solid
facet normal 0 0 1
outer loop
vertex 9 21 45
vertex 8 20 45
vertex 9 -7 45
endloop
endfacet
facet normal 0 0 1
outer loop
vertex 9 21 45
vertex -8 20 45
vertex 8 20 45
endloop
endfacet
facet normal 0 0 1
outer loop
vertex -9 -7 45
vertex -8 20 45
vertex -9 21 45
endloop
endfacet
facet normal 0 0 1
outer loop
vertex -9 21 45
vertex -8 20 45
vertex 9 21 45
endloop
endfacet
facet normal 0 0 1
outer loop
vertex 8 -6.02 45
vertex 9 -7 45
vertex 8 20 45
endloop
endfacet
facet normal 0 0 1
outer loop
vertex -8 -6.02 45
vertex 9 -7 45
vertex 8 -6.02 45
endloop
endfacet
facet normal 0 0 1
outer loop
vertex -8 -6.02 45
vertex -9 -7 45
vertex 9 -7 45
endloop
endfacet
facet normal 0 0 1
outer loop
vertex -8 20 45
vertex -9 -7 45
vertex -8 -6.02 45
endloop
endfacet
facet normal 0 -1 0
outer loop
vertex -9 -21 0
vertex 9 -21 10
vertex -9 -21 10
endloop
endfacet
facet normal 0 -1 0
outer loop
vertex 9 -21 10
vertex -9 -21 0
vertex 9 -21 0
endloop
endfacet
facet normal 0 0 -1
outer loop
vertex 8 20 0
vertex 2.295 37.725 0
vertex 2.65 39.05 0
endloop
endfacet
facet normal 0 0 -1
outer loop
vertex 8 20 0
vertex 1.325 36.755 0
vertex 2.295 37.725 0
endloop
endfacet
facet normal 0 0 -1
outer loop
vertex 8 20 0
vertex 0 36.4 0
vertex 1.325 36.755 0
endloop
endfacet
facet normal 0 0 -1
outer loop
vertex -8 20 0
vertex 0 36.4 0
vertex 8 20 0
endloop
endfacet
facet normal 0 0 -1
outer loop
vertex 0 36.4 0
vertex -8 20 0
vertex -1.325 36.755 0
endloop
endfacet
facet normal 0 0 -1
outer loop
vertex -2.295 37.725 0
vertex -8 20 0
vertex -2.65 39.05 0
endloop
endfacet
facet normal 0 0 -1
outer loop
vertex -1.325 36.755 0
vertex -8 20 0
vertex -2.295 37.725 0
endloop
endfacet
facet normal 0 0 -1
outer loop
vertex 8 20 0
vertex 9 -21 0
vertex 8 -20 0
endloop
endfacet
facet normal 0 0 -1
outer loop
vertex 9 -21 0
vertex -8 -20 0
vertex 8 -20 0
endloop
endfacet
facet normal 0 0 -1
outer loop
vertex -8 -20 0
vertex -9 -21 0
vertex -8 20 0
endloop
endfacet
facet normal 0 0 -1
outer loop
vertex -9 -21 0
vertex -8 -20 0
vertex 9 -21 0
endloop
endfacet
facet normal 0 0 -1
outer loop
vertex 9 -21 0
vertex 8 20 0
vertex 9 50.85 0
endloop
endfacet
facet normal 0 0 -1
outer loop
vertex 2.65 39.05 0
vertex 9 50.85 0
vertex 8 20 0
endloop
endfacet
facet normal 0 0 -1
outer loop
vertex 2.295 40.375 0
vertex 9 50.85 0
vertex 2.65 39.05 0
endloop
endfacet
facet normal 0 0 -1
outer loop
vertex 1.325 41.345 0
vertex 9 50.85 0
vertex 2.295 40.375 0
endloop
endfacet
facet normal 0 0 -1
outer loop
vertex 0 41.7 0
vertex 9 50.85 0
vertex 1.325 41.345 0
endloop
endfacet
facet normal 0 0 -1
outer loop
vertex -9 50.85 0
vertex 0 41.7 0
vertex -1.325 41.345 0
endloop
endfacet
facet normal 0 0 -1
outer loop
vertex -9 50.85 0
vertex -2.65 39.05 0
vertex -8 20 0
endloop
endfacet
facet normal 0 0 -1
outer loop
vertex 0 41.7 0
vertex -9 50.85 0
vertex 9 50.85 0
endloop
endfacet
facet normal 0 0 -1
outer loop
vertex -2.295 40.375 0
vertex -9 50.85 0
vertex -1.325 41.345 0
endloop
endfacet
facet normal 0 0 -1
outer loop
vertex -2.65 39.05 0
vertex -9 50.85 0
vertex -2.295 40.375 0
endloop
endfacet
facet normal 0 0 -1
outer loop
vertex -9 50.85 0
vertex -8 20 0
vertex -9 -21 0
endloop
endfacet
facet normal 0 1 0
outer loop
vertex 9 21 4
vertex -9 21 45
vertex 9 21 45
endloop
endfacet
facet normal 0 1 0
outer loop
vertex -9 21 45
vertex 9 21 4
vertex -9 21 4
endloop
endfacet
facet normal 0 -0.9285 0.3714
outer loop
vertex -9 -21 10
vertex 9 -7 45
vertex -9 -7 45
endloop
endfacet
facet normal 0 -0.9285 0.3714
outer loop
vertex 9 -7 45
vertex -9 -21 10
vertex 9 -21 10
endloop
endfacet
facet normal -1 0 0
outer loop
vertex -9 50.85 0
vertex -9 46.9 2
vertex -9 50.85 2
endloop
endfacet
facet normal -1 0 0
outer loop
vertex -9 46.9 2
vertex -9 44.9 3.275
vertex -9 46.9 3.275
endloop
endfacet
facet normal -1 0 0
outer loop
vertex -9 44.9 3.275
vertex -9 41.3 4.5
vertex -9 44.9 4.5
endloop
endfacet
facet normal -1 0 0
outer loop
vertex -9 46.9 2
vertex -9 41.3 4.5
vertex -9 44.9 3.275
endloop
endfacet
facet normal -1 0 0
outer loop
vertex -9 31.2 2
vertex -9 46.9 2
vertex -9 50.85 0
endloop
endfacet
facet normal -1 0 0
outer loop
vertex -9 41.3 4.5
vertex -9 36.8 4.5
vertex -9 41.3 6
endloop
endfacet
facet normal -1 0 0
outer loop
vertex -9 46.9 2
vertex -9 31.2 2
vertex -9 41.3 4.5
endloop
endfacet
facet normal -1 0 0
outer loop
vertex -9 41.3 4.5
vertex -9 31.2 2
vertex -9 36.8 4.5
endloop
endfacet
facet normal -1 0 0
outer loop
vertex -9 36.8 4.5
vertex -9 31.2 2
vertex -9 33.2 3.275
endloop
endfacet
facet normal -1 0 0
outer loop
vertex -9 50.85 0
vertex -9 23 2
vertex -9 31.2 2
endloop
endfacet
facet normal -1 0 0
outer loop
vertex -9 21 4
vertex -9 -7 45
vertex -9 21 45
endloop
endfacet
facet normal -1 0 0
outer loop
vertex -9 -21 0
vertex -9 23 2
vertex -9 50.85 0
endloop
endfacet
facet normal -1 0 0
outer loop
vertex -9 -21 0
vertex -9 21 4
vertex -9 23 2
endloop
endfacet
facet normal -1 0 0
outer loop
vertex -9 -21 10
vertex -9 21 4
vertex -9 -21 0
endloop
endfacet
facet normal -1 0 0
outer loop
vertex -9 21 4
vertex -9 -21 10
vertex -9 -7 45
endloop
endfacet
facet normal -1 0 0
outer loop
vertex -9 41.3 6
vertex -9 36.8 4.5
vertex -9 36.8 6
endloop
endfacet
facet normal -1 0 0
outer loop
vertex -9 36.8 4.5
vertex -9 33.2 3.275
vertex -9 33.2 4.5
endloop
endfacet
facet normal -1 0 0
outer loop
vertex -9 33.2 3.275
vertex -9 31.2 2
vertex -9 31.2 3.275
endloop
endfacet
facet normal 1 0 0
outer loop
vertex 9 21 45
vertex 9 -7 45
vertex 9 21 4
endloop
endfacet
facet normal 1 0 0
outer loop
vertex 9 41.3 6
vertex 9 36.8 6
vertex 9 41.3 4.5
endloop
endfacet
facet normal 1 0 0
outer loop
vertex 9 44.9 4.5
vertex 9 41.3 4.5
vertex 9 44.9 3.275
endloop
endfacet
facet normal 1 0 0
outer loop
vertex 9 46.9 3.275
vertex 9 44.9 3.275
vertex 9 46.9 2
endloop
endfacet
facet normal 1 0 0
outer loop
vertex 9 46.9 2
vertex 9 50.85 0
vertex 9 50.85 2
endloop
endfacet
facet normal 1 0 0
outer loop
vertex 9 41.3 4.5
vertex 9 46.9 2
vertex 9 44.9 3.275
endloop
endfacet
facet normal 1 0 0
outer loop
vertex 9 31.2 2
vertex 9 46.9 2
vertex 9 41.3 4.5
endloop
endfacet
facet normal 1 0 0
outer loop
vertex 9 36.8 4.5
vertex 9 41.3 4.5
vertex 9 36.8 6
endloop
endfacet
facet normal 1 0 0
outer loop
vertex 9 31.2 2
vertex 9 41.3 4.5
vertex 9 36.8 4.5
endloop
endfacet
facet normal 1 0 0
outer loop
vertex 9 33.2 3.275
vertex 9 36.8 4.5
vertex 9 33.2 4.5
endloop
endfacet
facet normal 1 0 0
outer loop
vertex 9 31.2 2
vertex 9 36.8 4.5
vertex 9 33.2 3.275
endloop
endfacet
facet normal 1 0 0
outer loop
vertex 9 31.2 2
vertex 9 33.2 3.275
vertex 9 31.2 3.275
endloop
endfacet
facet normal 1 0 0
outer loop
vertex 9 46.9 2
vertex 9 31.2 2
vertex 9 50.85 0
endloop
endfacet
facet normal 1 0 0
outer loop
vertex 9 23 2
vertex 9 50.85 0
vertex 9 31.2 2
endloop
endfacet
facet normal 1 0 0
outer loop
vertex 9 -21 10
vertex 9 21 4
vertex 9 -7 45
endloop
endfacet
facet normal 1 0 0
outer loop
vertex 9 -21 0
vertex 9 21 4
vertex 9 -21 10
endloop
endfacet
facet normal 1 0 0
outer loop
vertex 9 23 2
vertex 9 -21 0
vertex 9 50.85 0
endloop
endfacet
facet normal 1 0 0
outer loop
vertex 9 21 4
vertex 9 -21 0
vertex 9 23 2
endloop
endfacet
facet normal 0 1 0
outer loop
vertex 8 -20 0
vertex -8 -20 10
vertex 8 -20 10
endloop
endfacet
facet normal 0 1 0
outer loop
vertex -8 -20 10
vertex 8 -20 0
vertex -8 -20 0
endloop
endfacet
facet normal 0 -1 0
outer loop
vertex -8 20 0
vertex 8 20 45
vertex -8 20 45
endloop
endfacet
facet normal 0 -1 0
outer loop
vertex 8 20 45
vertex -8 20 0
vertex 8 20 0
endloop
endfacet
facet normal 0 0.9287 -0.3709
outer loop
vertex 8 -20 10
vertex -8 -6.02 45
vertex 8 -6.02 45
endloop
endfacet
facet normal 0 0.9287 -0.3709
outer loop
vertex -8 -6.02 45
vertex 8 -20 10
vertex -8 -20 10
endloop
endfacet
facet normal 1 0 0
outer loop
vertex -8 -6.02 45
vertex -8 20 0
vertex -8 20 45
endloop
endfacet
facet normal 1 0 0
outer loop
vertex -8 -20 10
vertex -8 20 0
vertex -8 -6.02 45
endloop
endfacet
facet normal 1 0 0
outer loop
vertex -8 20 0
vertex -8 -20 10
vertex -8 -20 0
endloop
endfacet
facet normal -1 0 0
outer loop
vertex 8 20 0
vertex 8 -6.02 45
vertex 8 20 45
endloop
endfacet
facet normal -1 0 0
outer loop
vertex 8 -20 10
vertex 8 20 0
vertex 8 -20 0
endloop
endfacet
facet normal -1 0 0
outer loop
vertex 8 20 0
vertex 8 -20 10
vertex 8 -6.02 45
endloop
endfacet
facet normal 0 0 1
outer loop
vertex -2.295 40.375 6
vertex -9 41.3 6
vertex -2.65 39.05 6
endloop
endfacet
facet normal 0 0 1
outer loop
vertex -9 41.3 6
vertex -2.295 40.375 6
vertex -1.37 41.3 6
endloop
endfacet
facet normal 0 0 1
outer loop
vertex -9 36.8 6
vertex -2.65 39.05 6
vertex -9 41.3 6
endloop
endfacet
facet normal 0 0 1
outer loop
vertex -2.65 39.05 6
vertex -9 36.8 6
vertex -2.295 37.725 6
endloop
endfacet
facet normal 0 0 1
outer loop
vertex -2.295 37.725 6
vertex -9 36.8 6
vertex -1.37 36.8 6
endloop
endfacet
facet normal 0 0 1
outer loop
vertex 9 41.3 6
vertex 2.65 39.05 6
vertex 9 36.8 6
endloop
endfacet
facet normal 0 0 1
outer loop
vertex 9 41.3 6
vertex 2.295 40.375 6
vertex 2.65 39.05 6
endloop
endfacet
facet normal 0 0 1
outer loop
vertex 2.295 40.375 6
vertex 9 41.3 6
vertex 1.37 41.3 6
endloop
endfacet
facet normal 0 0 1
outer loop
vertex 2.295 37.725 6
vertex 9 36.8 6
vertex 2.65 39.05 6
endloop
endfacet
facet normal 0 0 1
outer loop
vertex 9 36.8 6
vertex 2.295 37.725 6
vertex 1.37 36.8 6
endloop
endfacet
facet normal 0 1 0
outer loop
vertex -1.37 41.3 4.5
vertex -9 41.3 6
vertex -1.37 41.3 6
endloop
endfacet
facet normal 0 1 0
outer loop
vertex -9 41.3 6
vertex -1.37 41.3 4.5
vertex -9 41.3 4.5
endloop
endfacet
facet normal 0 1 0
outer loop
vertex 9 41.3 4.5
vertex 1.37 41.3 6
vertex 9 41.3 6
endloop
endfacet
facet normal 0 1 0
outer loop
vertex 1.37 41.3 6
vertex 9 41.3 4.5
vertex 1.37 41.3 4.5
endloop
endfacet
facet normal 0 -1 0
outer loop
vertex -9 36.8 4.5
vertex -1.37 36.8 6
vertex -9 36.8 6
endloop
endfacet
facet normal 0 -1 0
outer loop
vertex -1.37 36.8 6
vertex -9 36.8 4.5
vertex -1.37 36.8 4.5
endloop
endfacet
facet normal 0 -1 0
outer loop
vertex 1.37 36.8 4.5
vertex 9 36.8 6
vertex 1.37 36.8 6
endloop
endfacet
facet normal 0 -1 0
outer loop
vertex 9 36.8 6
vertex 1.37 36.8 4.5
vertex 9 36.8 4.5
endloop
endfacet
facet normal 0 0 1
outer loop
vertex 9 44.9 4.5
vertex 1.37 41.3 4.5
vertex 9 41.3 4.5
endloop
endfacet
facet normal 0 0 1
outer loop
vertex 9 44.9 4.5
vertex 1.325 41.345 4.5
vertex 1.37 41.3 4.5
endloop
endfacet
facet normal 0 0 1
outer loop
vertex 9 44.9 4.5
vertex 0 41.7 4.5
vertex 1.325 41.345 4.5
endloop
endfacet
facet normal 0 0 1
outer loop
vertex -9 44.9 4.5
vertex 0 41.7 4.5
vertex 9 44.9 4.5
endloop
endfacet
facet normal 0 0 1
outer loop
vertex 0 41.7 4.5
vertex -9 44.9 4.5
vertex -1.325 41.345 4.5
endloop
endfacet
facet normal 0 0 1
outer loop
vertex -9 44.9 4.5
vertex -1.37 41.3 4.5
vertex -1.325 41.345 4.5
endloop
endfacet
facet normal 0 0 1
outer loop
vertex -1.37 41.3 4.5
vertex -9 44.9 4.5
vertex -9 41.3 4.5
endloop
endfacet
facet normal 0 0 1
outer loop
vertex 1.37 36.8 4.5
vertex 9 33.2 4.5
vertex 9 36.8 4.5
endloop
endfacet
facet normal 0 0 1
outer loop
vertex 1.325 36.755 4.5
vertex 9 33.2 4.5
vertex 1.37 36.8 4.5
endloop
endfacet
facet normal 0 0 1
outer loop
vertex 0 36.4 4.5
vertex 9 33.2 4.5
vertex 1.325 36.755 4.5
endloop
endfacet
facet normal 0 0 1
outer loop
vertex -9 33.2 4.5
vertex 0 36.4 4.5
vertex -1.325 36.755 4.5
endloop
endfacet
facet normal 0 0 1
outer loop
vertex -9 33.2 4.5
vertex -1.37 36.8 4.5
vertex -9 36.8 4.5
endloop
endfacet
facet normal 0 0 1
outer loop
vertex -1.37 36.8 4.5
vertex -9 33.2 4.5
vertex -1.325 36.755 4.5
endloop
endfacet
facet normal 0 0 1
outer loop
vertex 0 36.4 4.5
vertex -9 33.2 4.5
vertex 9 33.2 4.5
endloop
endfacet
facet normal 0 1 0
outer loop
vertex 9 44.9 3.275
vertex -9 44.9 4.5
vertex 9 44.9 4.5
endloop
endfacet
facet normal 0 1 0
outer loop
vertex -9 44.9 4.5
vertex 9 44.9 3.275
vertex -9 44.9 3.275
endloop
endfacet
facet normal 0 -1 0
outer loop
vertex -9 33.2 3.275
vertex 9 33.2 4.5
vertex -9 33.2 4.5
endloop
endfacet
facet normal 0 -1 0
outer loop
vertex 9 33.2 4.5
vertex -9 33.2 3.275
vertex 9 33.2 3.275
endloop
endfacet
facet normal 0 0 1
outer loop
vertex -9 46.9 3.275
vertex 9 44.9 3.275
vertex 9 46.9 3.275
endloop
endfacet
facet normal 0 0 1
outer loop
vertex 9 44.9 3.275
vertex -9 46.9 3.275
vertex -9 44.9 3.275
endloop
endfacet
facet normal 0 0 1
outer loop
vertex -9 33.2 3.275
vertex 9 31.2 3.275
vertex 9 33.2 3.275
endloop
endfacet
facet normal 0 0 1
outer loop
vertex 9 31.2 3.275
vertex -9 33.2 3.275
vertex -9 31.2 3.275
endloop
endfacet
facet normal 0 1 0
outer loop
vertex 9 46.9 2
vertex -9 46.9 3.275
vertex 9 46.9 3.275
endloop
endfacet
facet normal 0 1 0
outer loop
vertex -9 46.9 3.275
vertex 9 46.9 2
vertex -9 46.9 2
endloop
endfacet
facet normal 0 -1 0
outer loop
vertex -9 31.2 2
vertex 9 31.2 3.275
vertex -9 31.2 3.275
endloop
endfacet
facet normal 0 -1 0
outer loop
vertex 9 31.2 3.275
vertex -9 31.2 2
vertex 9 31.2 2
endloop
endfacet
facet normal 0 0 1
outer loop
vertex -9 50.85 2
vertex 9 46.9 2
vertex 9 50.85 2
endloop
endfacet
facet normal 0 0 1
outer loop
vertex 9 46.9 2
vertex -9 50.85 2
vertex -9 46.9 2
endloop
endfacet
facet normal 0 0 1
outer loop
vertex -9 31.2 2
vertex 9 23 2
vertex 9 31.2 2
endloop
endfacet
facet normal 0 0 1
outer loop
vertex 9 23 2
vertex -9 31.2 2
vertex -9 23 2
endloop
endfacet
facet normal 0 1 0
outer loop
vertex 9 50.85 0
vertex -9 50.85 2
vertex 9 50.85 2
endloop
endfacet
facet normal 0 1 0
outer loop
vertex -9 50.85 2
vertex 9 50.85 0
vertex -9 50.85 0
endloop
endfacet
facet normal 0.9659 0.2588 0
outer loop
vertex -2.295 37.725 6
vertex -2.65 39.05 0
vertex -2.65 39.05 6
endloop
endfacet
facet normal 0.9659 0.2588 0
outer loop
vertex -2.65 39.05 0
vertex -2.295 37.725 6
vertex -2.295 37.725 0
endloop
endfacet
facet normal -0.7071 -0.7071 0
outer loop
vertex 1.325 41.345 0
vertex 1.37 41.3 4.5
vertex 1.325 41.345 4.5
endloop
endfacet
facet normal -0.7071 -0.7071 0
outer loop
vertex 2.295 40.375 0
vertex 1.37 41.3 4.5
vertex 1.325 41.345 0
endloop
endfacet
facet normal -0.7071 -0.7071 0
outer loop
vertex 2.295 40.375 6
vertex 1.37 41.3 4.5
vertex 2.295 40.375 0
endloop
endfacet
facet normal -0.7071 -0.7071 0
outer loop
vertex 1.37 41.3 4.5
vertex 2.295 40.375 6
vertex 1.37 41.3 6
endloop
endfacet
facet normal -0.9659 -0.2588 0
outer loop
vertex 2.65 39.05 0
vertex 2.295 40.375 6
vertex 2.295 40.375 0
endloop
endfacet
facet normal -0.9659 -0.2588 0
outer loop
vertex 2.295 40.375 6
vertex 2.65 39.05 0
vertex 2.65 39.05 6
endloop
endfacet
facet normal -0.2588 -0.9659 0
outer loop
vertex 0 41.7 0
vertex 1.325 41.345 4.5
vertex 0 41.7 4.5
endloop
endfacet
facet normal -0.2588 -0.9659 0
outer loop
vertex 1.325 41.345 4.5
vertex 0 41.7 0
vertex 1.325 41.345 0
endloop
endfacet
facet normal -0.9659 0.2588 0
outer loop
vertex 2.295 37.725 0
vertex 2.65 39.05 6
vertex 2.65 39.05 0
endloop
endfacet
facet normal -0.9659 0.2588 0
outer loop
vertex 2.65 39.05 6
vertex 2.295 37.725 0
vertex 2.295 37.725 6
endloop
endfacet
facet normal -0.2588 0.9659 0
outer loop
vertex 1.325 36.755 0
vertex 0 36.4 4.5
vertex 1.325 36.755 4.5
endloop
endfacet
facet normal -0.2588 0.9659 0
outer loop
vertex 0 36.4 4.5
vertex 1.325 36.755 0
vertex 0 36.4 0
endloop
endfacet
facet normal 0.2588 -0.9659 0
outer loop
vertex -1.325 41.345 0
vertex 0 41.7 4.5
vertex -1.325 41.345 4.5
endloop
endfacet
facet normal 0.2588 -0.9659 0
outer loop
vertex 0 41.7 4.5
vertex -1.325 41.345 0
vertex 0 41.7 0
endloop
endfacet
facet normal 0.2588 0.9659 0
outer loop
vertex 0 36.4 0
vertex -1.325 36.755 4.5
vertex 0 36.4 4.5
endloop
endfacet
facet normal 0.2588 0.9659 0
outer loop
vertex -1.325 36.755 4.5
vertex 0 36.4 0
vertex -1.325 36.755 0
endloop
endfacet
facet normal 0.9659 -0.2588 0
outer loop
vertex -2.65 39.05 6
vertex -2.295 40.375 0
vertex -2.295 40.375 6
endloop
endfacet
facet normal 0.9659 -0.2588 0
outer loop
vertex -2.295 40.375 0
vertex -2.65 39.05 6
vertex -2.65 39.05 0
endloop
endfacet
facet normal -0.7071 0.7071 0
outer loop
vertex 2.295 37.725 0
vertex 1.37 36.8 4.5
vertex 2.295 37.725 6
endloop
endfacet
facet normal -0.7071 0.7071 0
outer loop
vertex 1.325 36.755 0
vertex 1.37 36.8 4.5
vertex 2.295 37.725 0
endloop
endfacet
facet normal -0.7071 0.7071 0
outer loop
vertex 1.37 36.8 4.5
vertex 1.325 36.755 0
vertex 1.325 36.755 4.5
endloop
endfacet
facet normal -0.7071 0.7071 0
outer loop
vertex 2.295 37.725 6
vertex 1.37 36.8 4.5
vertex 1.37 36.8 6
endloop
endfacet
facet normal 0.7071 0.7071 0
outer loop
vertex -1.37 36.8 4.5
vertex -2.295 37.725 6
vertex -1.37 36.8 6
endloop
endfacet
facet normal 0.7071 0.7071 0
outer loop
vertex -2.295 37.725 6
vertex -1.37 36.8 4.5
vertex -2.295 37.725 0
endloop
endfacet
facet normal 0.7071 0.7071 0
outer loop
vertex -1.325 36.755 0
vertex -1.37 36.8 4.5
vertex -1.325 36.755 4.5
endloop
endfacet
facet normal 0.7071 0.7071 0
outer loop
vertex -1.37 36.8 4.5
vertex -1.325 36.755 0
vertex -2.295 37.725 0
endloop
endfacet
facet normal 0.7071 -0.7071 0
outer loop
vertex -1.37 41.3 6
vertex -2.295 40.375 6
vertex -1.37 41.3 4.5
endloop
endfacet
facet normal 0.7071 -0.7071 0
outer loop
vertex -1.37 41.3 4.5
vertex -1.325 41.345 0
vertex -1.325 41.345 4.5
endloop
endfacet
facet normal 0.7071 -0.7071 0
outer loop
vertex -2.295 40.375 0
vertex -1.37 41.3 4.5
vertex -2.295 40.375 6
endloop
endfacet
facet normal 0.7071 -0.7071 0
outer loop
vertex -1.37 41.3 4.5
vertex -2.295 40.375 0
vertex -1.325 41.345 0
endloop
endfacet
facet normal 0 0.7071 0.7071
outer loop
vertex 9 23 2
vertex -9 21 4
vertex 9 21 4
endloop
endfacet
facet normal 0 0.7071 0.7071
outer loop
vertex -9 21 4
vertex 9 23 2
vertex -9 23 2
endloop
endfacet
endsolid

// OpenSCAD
h = 45;
w = 16;
l = 40;
t = 1.0;
o = 0.65;

c = 0.3;
b = 27.5+c*2;
s = 5;

difference()
{
	hull()
	{
		translate( [ 0, 0, 5 ] )
		cube( [ w+t*2, l+t*2, 10 ], center = true );
		translate( [ 0, (l*o+t*2)/4, h-5 ] )
		cube( [ w+t*2, l*o+t*2, 10 ], center = true );
	}
	hull()
	{
		translate( [ 0, 0, 4.9 ] )
		cube( [ w+t*0, l+t*0, 10.2 ], center = true );
		translate( [ 0, (l*o+t*2)/4, h-5 ] )
		cube( [ w+t*0, l*o+t*0, 10.1 ], center = true );
	}
}
 
difference()
{
	translate( [ 0, l/2+b/2+s, t+t ] )
	{
		translate( [ 0, 0, +1.5 ] )
			cube( [ w+t*2, 4.5, 5 ], center = true );

		translate( [ 0,0, 0.75 ] )
			cube( [ w+t*2, 12-c, 1+2.5 ], center = true );

		translate( [ 0,0, 0.15 ] )
			cube( [ w+t*2, 16-c, 1+1.25 ], center = true );

		translate( [ 0,-s/2-1, -t ] )
			cube( [ w+t*2, b+s-2-t/2, t*2 ], center = true );

	}
	translate( [ 0, l/2+b/2+s, 0 ] )
		cylinder( r = 2.65, h = 100, center = true, $fn = 12 );
}

	translate( [ 0, t+l/2, t*2 ] )
		intersection()
		{
		rotate( [ 0, 90, 0 ] ) 
			cylinder( r = t*2, h = w+t*2, center = true, $fn = 4 );
		translate( [ 0, 5, 0 ] )
			cube( [ 100, 10+t/2, 100 ], center = true );
		}
